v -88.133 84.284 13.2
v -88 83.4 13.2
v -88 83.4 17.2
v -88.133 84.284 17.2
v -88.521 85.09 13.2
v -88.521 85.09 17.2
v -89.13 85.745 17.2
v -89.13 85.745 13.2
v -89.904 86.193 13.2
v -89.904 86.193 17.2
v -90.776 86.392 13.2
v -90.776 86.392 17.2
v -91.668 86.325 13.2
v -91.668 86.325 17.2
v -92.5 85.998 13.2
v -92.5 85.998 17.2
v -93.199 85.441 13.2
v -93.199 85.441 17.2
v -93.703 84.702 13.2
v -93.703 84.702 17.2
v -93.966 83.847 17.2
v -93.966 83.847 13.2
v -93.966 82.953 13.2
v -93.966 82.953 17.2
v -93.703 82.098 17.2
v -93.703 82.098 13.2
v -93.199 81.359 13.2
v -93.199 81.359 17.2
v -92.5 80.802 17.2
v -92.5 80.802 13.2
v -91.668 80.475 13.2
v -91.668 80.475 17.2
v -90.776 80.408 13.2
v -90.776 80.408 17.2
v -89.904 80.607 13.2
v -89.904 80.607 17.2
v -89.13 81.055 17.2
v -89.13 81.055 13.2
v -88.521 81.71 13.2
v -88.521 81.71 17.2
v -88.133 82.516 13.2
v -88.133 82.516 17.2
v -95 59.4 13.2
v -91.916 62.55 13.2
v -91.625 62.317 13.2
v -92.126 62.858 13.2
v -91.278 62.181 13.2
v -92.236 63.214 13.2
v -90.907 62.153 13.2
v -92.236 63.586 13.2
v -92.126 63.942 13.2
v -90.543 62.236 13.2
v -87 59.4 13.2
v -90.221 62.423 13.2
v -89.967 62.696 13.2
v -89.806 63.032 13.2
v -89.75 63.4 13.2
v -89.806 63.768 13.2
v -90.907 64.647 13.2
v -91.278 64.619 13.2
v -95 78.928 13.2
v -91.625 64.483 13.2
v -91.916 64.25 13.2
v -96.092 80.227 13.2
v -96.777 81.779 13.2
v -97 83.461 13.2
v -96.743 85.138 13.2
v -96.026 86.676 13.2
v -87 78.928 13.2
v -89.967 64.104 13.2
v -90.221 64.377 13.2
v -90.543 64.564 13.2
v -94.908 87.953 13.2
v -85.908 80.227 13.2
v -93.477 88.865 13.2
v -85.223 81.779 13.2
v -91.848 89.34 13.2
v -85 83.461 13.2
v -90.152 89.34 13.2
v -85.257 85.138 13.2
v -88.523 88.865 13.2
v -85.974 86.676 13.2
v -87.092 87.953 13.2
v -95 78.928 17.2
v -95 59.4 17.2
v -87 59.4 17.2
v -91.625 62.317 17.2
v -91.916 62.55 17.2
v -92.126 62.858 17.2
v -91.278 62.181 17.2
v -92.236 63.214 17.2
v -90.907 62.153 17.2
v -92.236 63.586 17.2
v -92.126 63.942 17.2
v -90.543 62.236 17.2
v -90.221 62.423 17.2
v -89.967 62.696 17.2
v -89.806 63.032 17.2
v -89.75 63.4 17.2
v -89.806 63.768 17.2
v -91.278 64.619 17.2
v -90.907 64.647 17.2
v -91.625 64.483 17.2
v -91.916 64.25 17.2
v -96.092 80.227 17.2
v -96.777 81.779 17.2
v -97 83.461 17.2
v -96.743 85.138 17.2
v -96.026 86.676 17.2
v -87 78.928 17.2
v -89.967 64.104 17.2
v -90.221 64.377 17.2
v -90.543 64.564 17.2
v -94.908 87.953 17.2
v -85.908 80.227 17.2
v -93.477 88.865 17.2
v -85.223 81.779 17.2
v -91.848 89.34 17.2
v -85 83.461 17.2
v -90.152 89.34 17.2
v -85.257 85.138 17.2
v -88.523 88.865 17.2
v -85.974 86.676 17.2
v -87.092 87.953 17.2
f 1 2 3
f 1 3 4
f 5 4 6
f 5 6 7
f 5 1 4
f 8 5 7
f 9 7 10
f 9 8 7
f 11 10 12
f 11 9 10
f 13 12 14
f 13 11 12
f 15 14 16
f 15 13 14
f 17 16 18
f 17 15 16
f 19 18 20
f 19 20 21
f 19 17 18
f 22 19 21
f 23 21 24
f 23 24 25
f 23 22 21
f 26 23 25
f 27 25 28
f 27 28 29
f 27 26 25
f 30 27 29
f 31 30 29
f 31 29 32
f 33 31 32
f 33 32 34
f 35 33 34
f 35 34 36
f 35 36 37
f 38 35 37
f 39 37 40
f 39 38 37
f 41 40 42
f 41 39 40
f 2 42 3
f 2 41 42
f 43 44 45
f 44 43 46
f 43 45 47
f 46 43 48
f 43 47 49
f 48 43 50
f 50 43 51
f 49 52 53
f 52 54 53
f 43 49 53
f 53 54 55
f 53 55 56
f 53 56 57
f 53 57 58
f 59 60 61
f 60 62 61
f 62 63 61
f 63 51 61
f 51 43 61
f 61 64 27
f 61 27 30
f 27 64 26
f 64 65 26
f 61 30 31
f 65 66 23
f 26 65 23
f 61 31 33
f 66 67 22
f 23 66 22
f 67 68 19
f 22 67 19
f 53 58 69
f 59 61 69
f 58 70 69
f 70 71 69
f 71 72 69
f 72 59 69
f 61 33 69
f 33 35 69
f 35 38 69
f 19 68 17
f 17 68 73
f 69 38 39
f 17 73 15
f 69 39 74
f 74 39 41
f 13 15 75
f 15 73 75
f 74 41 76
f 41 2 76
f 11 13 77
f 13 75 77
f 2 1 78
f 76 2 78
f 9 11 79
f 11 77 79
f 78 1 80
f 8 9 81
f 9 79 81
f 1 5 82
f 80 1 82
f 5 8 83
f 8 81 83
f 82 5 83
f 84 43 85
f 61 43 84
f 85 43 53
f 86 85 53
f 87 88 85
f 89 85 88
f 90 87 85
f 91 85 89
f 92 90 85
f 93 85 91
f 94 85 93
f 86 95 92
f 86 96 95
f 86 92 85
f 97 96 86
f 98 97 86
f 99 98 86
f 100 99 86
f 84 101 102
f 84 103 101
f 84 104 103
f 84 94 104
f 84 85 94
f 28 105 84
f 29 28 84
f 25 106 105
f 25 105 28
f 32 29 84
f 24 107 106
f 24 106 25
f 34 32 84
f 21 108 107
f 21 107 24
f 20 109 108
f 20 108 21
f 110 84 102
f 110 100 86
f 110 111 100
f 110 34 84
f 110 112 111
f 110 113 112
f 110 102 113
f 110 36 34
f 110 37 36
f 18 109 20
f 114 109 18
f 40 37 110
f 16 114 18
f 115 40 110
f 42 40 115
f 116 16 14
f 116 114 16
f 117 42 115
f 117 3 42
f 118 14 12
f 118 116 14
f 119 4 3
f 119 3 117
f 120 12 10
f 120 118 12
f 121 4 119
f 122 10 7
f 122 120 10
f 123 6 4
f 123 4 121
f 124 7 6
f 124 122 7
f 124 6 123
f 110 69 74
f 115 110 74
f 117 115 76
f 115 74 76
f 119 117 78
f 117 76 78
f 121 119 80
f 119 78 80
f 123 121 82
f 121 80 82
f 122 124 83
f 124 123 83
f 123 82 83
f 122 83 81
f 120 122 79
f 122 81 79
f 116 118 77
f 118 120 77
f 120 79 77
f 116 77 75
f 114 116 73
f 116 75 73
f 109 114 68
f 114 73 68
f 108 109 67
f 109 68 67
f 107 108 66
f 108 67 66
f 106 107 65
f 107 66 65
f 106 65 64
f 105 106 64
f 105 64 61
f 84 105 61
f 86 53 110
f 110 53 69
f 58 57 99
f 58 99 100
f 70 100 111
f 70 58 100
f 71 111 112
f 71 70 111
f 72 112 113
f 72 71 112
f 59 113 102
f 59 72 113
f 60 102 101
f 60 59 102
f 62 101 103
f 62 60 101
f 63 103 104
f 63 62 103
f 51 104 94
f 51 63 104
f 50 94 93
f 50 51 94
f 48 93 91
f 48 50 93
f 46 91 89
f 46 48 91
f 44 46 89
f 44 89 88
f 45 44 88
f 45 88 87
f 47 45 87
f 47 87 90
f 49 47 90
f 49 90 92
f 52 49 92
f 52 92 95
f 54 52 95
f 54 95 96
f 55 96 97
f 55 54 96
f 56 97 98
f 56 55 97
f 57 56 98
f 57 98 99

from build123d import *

# Parameters (mm, degrees)
HORN_ARM_SKETCH_W       = 8
HORN_ARM_SKETCH_H       = 24
HORN_ARM_DEPTH          = 4
HORN_HUB_SKETCH_R       = 6
HORN_HUB_DEPTH          = 4
SHAFT_BORE_SKETCH_R     = 3
SHAFT_BORE_DEPTH        = 4
BALL_STUD_HOLE_SKETCH_R = 1.25
BALL_STUD_HOLE_DEPTH    = 4


with BuildPart() as part:
    # Horn Arm Sketch → Horn Arm (new body)
    with BuildSketch(Plane.XY.offset(13.2)):
        with Locations((-91, 71.4)):
            Rectangle(HORN_ARM_SKETCH_W, HORN_ARM_SKETCH_H)
    extrude(amount=HORN_ARM_DEPTH)

    # Horn Hub Sketch → Horn Hub (add)
    with BuildSketch(Plane.XY.offset(13.2)):
        with Locations((-91, 83.4)):
            Circle(HORN_HUB_SKETCH_R)
    extrude(amount=HORN_HUB_DEPTH)

    # Shaft Bore Sketch → Shaft Bore (cut)
    with BuildSketch(Plane.XY.offset(13.2)):
        with Locations((-91, 83.4)):
            Circle(SHAFT_BORE_SKETCH_R)
    extrude(amount=SHAFT_BORE_DEPTH, mode=Mode.SUBTRACT)

    # Ball Stud Hole Sketch → Ball Stud Hole (cut)
    with BuildSketch(Plane.XY.offset(13.2)):
        with Locations((-91, 63.4)):
            Circle(BALL_STUD_HOLE_SKETCH_R)
    extrude(amount=BALL_STUD_HOLE_DEPTH, mode=Mode.SUBTRACT)


solid = part.part
